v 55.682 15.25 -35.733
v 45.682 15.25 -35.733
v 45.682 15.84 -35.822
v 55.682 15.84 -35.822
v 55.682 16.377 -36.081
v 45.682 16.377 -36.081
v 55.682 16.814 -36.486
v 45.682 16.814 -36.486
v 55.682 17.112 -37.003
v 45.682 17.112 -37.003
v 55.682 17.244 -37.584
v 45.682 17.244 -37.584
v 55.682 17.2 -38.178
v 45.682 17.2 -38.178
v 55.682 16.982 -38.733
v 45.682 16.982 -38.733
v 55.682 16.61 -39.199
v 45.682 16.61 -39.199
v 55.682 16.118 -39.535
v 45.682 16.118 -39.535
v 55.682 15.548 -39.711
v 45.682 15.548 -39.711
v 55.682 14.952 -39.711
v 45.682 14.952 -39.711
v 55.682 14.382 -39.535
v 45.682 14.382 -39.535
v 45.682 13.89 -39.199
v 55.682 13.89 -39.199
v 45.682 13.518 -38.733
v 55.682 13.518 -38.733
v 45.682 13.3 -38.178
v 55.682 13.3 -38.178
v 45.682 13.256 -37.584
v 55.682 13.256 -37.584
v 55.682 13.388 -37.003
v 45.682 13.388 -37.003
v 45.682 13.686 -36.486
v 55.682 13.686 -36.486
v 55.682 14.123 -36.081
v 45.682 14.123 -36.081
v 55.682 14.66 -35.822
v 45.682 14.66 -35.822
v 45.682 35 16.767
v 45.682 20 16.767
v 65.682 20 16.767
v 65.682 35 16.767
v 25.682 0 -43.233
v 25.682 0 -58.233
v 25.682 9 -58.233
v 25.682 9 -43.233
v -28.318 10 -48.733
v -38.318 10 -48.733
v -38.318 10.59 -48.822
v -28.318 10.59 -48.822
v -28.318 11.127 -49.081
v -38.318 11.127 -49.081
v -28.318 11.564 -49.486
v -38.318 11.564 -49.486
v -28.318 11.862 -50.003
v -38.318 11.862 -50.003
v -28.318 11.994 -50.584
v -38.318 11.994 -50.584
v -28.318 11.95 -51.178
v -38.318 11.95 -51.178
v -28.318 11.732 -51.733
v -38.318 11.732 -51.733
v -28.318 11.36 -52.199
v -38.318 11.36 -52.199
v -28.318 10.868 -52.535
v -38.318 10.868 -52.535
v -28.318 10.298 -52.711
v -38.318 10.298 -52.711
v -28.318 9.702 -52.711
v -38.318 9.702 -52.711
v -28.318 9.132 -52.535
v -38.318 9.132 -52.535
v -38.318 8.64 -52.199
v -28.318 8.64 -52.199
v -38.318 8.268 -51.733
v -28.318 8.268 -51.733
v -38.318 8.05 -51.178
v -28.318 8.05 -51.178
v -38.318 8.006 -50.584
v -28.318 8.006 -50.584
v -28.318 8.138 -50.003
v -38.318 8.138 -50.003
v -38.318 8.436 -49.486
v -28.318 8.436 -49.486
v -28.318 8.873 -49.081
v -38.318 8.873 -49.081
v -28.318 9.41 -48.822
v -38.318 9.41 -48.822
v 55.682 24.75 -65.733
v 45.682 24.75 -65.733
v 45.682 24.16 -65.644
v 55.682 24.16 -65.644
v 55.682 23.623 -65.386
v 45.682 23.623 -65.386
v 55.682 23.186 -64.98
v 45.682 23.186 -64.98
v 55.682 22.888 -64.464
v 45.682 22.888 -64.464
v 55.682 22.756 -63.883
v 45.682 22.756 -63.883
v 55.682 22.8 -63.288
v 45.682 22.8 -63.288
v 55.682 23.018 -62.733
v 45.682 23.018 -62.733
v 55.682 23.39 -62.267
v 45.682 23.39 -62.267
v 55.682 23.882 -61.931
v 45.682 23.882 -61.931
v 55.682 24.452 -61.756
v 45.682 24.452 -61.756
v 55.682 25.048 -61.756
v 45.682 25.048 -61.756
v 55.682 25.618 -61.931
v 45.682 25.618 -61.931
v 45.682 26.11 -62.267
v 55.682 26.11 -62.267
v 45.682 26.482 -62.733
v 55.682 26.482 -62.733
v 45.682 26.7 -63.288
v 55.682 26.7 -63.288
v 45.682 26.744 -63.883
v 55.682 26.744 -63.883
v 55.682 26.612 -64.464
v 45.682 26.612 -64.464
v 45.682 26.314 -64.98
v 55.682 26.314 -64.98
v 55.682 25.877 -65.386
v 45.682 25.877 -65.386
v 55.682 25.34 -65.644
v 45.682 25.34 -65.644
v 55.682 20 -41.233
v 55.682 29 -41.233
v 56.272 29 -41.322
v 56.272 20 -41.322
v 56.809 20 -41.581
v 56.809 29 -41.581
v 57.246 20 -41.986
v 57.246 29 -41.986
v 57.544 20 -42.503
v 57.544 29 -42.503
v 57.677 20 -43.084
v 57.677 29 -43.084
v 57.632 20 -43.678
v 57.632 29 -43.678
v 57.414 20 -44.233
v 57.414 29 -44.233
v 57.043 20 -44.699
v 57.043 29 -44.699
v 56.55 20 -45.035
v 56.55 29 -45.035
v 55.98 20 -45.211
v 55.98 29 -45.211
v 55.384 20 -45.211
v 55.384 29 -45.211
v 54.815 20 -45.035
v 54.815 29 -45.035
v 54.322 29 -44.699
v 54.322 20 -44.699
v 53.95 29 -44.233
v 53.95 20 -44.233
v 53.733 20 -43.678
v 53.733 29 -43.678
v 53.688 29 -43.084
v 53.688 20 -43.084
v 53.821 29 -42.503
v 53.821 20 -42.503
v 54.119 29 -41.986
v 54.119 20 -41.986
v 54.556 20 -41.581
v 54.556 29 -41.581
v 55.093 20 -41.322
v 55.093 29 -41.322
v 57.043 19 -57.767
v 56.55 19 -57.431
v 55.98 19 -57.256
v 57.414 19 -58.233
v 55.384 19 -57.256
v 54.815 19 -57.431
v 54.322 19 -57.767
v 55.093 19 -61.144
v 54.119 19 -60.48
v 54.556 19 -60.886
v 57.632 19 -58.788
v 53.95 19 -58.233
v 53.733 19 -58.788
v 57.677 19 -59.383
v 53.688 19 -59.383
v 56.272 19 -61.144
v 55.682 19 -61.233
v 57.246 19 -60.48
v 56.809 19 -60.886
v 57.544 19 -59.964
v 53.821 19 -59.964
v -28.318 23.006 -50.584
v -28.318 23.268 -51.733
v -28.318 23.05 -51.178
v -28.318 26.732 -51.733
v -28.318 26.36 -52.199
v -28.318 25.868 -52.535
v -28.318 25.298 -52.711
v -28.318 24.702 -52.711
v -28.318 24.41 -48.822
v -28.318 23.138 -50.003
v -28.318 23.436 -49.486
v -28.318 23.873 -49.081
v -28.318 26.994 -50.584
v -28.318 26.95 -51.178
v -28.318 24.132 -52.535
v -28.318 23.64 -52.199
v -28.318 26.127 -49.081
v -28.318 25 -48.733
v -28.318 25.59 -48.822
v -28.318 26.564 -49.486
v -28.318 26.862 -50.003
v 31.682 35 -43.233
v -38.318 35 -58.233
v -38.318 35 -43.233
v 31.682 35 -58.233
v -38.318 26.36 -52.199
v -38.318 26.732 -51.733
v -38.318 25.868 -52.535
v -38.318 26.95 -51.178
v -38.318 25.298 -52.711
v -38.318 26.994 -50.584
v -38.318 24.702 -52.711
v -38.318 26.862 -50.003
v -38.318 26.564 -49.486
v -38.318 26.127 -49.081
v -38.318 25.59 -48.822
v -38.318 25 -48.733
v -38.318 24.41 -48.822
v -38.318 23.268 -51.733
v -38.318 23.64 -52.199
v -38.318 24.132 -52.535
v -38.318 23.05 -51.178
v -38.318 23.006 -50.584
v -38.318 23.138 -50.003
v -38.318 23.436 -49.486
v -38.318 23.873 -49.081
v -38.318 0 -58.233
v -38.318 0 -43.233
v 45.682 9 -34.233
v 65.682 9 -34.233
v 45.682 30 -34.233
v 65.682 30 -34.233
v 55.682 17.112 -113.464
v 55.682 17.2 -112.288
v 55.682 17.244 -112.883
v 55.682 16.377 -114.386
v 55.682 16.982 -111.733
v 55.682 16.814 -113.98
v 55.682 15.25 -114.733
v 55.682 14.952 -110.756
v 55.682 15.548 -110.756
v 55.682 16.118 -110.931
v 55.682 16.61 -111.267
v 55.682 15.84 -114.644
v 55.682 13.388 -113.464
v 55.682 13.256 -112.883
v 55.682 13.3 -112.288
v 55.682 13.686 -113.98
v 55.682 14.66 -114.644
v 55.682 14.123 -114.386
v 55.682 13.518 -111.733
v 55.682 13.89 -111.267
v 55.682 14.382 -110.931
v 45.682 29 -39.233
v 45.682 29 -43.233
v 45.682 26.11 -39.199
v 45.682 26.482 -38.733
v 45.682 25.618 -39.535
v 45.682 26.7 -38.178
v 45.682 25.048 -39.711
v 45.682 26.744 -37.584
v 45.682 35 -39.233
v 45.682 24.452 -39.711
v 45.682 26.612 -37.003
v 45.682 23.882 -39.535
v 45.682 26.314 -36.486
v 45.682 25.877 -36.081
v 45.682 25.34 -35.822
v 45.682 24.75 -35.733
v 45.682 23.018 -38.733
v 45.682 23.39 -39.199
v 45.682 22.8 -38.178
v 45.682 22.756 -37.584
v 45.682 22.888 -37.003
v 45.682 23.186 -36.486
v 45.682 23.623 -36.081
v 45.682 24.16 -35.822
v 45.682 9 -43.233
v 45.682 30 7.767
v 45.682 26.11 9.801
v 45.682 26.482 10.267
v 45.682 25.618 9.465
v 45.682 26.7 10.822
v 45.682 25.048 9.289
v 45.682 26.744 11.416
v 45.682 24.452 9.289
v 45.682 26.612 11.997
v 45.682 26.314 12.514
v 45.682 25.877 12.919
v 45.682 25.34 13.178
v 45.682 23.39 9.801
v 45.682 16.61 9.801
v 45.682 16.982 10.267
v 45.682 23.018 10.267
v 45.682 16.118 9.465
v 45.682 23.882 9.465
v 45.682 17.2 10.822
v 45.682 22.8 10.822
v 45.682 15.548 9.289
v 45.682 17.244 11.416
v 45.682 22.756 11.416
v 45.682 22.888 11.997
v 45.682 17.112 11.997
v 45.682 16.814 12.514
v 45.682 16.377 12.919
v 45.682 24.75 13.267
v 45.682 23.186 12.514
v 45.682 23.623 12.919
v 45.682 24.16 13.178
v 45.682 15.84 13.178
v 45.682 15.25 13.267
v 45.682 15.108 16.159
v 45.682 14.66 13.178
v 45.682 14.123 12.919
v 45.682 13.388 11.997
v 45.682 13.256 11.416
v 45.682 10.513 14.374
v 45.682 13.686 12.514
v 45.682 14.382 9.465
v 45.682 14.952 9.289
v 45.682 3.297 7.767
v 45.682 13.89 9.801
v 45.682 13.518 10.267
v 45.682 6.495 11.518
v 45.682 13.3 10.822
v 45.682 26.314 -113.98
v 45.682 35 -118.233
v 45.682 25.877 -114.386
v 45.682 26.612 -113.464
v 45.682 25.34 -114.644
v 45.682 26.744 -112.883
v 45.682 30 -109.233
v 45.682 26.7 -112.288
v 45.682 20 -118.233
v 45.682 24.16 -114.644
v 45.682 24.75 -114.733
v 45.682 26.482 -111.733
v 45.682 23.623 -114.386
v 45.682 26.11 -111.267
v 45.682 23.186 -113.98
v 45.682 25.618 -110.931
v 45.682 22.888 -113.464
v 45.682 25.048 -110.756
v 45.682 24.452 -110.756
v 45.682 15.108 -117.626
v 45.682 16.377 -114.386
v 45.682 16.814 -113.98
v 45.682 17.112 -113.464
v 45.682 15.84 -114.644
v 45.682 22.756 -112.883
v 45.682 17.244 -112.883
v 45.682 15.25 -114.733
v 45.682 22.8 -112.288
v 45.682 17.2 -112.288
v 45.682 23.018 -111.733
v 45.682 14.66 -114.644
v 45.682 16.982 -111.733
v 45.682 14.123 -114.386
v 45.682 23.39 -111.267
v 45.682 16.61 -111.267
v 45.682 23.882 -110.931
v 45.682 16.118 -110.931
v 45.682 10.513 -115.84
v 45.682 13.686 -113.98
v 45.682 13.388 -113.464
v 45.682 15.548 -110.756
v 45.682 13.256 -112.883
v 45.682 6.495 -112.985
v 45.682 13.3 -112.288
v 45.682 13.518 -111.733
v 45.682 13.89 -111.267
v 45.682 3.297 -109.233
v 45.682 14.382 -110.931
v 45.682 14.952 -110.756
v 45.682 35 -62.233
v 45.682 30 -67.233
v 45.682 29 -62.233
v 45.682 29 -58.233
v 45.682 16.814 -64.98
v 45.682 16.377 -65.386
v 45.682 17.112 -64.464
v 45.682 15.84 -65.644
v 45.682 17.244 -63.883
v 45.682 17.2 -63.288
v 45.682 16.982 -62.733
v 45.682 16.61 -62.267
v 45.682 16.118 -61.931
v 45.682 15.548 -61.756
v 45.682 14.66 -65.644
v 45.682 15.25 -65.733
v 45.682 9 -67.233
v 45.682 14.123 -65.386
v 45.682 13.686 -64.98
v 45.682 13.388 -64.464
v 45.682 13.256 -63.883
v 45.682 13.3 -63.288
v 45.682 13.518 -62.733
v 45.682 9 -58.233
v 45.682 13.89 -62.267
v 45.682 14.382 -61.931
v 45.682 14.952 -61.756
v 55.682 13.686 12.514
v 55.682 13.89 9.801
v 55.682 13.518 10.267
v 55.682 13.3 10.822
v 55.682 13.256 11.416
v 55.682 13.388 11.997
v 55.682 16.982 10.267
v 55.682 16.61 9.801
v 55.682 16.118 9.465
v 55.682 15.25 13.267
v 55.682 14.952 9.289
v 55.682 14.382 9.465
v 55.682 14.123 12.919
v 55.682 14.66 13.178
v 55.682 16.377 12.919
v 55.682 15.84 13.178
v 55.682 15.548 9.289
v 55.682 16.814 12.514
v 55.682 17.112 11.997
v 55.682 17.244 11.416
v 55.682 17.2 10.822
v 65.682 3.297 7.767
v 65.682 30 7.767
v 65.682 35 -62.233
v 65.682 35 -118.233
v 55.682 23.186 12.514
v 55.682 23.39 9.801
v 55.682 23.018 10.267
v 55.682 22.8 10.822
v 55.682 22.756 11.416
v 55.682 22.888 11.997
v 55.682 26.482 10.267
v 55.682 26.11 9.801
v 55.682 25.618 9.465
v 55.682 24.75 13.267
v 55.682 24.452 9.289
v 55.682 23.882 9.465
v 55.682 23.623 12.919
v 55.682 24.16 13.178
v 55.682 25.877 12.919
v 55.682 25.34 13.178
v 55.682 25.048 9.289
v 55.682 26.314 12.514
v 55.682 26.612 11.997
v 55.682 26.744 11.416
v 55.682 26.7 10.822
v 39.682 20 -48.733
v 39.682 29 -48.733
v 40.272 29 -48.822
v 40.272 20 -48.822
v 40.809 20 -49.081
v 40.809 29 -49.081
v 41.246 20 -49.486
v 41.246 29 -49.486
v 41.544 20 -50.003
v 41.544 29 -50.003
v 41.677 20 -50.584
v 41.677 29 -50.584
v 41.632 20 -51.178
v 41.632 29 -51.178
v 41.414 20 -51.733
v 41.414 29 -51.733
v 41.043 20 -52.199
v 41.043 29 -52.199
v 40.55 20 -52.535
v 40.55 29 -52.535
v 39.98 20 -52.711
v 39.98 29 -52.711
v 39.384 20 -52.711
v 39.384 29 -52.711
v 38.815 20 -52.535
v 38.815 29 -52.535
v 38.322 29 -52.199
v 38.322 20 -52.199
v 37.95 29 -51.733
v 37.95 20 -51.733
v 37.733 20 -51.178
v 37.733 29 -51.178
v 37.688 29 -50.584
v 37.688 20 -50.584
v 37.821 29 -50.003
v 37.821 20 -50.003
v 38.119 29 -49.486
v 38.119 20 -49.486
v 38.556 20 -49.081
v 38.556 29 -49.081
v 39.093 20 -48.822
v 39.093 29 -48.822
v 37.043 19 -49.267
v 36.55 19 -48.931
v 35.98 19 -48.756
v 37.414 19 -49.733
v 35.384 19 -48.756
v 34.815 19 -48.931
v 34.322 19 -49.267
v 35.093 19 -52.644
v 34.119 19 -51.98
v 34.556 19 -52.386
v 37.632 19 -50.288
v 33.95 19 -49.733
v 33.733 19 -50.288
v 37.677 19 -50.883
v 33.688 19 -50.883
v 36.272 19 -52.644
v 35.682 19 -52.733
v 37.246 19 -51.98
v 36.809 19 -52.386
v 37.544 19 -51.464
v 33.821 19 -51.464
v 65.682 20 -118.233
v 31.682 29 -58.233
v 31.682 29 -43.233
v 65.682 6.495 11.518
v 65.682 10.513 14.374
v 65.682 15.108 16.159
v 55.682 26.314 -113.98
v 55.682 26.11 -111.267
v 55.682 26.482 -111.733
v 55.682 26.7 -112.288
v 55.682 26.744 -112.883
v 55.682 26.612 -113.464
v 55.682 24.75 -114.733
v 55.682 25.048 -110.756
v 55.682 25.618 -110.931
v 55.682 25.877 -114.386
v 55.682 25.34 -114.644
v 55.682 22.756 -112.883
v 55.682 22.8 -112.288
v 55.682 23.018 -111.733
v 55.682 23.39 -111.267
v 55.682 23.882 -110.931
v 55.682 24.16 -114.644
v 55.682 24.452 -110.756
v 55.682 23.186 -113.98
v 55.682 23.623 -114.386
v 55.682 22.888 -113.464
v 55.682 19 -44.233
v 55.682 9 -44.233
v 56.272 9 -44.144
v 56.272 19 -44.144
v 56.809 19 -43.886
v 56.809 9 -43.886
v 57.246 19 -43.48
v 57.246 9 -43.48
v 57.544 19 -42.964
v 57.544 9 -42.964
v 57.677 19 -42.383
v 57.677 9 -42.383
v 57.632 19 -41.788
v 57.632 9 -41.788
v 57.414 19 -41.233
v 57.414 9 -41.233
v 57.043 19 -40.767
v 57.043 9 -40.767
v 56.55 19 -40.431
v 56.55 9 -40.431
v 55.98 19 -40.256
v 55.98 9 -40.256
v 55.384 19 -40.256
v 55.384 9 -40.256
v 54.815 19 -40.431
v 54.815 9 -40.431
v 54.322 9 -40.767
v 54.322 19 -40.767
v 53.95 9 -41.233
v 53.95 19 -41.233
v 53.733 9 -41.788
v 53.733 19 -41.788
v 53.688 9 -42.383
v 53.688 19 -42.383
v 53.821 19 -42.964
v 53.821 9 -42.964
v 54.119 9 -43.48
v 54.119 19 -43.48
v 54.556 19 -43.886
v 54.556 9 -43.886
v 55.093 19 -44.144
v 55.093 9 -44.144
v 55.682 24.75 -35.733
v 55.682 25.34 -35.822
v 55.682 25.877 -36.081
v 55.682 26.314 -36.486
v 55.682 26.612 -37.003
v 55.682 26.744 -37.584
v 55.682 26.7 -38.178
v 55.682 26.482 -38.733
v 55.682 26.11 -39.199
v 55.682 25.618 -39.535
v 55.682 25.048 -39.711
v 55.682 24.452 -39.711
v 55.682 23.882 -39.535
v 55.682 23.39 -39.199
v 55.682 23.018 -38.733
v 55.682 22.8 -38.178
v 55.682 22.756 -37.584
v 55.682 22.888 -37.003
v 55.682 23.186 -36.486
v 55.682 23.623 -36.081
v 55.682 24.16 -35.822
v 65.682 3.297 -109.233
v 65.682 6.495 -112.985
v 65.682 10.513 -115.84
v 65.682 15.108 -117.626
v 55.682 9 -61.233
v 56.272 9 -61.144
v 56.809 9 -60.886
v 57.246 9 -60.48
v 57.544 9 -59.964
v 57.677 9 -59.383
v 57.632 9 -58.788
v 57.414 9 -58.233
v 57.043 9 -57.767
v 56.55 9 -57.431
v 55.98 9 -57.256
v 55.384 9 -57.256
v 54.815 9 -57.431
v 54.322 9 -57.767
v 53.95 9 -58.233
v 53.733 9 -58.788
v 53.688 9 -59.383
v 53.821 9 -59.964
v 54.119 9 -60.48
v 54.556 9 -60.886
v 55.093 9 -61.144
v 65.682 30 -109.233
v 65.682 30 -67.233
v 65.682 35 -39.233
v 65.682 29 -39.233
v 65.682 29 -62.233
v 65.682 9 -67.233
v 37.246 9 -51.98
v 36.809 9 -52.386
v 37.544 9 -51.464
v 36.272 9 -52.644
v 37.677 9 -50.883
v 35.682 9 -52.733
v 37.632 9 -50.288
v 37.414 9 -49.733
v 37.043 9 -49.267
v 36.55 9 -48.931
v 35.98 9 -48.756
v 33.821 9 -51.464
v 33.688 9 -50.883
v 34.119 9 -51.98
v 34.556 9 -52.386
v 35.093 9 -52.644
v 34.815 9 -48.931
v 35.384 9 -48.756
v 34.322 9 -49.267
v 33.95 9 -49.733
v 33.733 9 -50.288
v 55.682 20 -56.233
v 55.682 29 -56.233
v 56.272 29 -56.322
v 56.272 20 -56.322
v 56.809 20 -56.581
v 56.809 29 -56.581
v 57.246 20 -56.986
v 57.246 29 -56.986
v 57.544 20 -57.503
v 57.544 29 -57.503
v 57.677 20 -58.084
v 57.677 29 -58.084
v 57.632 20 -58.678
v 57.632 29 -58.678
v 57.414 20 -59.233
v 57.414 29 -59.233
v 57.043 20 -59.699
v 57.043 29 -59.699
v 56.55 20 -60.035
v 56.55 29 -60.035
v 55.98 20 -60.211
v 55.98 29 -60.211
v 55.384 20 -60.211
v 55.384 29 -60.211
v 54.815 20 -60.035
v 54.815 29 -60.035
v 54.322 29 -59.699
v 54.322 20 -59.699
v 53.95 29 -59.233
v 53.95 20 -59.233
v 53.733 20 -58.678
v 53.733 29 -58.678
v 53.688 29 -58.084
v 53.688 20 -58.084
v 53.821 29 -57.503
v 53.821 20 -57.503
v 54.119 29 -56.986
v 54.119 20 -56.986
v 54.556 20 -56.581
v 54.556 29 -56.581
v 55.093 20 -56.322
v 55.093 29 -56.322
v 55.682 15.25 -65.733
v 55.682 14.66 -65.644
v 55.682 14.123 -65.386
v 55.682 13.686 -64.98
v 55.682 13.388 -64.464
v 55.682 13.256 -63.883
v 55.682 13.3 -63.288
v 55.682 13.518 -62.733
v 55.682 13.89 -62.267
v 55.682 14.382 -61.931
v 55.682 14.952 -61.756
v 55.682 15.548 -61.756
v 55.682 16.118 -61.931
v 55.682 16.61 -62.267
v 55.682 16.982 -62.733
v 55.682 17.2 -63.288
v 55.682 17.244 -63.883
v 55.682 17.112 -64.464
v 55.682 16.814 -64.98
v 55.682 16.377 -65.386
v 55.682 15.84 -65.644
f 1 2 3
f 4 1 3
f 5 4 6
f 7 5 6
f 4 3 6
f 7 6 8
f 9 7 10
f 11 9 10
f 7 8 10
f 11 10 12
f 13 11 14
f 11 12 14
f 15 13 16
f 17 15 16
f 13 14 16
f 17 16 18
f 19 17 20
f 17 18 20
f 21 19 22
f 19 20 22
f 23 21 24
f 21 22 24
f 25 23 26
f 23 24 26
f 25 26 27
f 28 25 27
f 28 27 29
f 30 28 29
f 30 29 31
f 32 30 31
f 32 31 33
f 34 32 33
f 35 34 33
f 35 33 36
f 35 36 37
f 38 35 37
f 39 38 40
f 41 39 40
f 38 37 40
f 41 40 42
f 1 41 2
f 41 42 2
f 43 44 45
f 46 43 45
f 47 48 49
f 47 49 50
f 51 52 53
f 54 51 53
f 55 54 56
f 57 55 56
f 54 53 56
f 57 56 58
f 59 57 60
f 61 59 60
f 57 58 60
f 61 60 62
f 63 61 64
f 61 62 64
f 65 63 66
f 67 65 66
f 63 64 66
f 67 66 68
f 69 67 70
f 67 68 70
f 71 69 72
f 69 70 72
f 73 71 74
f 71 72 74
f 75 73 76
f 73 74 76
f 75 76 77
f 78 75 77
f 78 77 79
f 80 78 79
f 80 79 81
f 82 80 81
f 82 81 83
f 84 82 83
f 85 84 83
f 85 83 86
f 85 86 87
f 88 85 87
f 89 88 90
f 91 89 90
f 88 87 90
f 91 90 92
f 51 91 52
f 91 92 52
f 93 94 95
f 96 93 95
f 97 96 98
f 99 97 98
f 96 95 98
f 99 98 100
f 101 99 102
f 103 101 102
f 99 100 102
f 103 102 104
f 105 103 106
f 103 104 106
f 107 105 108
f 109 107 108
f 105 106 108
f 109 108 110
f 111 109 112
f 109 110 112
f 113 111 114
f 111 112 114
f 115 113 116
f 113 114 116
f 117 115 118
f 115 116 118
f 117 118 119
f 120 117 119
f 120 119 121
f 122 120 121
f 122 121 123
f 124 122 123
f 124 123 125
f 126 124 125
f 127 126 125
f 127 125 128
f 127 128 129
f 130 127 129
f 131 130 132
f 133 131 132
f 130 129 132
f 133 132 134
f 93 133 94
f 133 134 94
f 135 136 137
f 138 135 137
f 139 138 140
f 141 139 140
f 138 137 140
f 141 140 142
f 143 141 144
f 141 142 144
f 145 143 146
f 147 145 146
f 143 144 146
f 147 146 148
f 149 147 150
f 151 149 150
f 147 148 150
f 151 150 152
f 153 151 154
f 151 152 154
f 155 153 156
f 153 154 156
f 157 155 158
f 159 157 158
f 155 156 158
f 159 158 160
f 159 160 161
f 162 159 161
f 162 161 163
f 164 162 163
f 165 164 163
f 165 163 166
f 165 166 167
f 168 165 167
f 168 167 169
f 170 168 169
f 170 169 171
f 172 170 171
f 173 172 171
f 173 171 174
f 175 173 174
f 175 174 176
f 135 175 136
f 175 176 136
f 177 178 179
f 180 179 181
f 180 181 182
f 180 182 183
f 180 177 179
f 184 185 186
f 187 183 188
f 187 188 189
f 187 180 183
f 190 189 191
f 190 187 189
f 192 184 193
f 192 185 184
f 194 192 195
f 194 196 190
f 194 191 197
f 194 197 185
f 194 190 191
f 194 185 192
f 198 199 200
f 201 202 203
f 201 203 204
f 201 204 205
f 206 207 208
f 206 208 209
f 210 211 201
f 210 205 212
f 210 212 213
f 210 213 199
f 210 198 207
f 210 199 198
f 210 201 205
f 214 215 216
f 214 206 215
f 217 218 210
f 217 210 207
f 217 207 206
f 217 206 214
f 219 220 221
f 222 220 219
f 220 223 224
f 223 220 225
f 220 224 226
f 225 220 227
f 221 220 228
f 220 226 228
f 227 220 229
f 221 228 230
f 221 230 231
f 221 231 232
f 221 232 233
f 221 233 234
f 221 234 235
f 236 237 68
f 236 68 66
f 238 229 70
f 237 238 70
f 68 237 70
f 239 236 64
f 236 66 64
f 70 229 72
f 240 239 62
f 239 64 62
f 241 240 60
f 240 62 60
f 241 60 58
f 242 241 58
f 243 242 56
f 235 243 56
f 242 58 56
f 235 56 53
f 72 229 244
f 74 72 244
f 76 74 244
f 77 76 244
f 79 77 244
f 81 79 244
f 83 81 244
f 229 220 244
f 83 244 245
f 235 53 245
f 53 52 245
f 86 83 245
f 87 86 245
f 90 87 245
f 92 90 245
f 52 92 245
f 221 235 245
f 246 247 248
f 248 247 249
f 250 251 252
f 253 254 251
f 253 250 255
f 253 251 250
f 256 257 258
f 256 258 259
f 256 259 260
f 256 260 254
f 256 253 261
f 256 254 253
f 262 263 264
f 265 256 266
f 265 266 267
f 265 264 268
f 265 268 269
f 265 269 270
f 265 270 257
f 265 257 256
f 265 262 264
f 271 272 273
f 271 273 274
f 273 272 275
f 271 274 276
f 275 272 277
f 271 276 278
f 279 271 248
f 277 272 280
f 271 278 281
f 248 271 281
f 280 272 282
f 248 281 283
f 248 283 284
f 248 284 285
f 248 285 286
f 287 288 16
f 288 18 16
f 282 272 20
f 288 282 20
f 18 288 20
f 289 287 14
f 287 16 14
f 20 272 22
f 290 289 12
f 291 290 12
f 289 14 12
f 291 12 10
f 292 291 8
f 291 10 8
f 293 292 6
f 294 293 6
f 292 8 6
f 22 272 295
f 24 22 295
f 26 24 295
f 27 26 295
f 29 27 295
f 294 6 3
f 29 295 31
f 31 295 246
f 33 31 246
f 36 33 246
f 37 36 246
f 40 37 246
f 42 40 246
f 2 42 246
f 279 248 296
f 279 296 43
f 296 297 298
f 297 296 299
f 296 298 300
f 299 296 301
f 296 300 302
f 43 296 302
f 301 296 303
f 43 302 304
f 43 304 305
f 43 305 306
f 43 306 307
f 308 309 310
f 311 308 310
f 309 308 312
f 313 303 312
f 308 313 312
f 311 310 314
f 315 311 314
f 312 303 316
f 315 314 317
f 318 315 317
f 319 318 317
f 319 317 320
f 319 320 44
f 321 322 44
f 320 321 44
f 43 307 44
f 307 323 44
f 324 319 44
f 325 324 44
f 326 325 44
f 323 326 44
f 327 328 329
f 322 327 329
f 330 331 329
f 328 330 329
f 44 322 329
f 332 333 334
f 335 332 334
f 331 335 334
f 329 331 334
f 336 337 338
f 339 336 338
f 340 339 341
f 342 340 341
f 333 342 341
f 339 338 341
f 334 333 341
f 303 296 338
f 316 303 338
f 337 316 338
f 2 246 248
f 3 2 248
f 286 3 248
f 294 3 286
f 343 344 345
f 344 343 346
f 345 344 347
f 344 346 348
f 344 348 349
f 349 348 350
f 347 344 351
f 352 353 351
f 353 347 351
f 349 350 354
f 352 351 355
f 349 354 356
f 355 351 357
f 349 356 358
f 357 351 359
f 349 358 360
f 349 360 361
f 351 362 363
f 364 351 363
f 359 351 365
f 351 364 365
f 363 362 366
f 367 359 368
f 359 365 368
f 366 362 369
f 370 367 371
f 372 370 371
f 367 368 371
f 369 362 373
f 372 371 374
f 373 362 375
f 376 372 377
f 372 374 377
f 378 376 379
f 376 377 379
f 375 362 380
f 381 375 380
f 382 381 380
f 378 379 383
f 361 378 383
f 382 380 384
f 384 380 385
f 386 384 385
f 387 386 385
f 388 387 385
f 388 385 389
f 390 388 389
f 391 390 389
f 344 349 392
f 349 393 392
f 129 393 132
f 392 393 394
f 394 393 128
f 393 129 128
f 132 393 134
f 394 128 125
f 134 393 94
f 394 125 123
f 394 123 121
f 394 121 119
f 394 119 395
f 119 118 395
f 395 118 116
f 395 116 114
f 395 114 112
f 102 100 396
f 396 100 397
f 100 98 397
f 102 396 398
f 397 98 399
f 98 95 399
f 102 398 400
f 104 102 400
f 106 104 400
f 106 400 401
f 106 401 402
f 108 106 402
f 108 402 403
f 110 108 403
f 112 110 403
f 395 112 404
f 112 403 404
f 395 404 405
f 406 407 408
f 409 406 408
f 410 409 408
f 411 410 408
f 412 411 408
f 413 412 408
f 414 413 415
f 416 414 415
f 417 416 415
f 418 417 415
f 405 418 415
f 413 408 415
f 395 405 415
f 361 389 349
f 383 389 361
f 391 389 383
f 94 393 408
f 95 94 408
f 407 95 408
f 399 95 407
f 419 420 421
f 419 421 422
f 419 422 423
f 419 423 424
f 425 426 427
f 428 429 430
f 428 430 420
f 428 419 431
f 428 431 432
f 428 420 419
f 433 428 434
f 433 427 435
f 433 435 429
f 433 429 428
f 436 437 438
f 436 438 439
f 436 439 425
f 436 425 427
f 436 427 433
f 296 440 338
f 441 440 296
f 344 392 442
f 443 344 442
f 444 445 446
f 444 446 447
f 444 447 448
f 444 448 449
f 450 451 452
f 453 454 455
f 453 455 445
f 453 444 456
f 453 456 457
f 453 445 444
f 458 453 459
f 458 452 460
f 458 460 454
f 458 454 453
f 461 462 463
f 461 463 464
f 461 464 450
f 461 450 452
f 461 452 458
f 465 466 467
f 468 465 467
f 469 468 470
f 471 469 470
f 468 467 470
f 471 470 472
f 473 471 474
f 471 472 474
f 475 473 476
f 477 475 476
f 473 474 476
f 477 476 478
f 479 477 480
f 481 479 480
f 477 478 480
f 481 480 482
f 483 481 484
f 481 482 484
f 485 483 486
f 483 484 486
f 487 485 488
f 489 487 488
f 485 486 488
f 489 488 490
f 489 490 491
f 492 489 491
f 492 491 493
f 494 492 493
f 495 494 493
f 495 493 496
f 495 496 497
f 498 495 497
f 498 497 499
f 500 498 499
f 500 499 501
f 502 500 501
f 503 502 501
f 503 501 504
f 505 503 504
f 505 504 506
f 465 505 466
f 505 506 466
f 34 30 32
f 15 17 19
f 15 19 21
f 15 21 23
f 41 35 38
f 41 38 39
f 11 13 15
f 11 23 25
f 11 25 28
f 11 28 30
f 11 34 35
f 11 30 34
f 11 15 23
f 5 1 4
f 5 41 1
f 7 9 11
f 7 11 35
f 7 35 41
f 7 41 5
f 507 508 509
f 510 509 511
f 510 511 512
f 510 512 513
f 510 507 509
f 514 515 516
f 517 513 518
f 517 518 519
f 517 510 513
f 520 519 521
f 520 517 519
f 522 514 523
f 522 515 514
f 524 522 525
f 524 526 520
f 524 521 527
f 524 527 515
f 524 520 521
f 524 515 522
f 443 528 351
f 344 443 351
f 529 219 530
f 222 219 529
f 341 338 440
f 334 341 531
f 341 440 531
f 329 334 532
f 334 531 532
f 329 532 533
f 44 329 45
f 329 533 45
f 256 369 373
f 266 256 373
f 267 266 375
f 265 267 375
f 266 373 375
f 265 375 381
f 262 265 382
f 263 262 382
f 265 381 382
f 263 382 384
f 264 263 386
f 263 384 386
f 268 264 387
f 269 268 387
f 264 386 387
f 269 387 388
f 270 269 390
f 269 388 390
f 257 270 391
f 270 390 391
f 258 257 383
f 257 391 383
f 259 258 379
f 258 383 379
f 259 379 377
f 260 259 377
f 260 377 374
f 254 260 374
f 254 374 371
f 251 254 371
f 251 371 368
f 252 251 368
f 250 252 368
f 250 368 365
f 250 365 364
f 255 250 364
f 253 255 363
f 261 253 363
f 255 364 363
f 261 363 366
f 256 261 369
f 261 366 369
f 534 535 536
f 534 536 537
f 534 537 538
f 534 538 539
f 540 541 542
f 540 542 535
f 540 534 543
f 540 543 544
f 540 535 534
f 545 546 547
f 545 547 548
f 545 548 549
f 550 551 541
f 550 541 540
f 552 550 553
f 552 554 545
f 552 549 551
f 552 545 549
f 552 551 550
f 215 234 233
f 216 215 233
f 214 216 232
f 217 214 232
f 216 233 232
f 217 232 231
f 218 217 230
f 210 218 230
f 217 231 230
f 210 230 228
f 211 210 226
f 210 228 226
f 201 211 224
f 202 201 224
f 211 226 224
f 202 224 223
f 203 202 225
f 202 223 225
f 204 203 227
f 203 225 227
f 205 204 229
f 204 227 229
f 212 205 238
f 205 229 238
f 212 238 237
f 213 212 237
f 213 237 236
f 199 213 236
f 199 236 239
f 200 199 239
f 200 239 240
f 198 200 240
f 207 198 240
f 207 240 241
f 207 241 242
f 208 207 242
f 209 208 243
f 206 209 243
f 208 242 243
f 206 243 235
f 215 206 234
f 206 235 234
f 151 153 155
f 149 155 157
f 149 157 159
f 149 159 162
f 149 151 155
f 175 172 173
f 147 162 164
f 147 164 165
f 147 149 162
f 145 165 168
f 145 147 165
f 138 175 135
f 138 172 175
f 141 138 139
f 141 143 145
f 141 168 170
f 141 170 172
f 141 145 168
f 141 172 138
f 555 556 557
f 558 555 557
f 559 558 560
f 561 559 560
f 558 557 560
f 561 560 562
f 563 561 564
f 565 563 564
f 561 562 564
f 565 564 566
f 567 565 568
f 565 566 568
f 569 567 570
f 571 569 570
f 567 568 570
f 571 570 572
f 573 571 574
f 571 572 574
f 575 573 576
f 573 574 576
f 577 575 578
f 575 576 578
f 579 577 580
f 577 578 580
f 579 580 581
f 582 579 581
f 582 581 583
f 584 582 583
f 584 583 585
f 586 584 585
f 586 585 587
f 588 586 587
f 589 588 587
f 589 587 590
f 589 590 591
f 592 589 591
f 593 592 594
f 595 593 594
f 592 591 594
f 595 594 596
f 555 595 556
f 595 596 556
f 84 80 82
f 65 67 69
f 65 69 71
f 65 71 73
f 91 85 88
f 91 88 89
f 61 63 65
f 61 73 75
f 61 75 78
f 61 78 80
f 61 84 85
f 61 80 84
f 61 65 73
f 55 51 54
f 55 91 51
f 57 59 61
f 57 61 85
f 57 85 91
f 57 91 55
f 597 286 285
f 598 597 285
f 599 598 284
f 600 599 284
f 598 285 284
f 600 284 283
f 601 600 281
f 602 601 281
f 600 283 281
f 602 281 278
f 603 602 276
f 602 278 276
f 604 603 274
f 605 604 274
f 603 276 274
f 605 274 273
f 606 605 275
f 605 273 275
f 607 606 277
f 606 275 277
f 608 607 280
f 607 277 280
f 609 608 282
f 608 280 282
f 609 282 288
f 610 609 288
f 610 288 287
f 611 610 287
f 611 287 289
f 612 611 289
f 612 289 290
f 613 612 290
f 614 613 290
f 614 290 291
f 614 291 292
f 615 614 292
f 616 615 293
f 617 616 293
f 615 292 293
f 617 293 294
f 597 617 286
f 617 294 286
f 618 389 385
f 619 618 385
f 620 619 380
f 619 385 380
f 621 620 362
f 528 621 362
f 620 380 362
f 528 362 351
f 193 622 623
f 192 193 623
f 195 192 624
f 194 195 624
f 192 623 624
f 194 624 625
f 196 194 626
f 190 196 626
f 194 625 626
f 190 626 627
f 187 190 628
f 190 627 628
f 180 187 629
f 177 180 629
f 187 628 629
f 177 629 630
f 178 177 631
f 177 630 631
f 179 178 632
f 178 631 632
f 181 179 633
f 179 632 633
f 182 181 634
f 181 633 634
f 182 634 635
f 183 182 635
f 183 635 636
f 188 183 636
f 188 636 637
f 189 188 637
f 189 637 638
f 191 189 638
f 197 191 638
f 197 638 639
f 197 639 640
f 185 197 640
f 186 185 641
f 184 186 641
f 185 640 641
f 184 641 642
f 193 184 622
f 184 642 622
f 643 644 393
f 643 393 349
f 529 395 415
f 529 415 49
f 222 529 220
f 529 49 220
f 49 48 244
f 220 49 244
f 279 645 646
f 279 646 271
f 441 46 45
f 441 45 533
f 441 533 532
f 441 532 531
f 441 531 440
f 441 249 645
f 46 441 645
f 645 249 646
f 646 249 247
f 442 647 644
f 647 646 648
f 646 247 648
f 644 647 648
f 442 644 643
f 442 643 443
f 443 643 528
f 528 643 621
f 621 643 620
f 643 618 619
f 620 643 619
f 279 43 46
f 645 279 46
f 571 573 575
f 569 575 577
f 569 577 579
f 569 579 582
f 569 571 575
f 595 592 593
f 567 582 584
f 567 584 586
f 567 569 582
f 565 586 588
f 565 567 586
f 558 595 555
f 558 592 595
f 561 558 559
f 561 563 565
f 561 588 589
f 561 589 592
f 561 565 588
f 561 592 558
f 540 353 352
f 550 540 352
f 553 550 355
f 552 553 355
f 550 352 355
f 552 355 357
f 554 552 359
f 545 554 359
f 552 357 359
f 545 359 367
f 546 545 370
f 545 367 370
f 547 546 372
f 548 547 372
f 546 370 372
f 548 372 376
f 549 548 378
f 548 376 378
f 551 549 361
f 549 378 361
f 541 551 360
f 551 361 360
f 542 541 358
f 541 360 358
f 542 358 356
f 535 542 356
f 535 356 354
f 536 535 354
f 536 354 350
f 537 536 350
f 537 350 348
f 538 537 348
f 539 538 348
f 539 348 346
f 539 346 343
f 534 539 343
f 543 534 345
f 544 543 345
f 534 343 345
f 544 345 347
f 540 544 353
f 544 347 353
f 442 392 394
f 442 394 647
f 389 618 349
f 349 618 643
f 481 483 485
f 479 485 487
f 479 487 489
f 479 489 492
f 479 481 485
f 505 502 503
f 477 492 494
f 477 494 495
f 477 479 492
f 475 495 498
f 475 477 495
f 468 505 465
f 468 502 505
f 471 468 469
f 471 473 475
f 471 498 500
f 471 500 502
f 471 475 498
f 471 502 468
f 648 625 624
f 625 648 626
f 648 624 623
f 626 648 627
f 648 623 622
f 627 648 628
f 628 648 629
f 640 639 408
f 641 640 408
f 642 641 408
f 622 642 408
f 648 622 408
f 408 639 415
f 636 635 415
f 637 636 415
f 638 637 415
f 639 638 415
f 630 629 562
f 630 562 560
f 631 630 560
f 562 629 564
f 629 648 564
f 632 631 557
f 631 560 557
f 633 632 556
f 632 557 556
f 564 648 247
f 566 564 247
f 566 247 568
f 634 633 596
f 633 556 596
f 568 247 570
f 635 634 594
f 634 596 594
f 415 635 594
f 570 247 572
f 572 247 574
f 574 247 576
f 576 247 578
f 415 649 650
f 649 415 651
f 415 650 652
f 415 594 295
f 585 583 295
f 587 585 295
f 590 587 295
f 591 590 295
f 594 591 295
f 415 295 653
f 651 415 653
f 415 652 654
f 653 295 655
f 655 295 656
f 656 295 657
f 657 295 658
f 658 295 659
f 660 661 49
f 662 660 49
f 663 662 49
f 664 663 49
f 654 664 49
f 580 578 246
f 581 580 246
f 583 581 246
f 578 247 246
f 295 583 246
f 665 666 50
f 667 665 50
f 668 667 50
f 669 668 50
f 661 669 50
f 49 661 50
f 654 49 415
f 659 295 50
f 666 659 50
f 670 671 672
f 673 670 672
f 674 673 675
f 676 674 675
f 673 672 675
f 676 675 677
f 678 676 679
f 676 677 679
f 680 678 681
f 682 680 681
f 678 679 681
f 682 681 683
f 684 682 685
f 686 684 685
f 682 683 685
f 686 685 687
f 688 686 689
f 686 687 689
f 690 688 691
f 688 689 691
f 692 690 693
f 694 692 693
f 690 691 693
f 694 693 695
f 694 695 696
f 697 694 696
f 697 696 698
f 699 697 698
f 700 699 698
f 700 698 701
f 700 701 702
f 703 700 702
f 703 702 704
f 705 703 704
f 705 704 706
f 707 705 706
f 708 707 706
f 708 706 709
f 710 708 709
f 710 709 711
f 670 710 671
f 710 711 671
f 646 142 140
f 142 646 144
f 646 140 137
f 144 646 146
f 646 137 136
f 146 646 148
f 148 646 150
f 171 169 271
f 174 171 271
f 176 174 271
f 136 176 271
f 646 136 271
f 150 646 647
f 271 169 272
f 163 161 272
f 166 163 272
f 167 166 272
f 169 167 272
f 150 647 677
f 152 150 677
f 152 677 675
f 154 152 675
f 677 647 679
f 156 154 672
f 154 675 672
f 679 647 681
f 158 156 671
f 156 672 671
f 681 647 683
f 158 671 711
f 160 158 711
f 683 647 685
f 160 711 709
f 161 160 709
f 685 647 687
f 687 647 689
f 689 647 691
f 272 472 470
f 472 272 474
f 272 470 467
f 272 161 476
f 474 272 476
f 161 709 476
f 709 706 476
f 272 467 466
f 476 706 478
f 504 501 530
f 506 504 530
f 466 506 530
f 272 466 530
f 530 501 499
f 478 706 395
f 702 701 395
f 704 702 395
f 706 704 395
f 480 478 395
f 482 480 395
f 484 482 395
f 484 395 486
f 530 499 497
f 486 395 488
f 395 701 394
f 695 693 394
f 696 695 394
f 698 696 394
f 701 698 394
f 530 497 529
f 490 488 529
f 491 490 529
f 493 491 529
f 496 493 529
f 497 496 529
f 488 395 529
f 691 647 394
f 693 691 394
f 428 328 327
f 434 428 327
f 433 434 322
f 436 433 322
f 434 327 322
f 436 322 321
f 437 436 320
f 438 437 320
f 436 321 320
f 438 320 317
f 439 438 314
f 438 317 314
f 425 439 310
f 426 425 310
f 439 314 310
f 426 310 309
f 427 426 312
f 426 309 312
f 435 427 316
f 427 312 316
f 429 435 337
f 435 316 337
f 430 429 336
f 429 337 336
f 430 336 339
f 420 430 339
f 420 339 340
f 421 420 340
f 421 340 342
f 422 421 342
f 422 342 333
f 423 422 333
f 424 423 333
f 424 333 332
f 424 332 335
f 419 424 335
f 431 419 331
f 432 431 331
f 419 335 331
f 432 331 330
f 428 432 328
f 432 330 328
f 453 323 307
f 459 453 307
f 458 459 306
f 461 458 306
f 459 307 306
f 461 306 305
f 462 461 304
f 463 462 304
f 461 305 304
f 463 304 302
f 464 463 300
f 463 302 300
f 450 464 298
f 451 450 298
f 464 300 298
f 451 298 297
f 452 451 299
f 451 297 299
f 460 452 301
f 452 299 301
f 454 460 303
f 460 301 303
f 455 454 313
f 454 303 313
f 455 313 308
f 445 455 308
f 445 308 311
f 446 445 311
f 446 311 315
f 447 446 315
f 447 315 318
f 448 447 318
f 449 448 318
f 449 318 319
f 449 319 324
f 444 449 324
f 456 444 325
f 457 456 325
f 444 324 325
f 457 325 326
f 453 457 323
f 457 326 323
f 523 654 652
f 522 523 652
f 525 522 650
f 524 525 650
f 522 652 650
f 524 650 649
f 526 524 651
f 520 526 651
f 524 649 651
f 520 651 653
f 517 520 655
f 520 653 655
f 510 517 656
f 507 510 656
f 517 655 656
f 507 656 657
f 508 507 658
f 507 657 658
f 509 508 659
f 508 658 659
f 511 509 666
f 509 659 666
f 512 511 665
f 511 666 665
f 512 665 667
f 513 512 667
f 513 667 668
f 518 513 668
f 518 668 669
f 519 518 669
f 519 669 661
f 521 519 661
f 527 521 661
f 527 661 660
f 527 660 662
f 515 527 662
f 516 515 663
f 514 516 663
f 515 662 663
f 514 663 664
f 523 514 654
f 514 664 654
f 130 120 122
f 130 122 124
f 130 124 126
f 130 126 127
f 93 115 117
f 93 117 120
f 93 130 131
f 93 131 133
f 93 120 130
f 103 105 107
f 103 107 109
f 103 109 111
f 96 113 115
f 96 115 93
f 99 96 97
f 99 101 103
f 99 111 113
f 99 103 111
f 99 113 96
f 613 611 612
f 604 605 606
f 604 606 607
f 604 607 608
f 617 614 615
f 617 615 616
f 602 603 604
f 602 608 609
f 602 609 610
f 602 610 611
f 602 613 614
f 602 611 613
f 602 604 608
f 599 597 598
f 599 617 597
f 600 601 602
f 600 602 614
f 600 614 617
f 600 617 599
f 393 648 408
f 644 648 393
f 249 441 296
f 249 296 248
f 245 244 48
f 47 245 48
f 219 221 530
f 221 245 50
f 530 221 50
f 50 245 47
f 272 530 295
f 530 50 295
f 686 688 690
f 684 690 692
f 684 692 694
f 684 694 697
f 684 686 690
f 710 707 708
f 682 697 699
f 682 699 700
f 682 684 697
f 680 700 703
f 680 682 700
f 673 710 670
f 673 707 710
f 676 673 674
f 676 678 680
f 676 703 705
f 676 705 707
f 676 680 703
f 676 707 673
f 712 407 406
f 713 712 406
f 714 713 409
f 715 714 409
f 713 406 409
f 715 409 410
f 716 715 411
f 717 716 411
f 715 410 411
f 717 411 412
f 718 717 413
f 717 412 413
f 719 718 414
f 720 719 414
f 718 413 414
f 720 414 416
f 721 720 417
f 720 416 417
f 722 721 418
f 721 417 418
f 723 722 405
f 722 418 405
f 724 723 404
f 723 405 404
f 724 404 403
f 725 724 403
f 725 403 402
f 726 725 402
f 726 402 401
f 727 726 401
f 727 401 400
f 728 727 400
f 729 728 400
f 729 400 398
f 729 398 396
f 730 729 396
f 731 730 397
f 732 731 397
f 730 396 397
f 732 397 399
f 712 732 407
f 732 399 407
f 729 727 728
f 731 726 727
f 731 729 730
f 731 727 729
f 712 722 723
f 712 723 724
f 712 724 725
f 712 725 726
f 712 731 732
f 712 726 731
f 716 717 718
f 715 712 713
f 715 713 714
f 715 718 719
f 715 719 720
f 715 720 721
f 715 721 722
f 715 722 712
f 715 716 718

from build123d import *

# Parameters (mm, degrees)
BOSS_EXTRUDE1_DEPTH = 35
CUT_EXTRUDE1_REACH  = 163.307
SKETCH2_W           = 42
SKETCH2_H           = 21
SKETCH3_R           = 2
CUT_EXTRUDE2_DEPTH  = 10
FILLET1_R           = 20
CUT_EXTRUDE5_REACH  = 163.307
SKETCH6_W           = 42
SKETCH6_H           = 9
SKETCH7_R           = 2
CUT_EXTRUDE6_DEPTH  = 10
CUT_EXTRUDE7_DEPTH  = 9
SKETCH9_R           = 2
CUT_EXTRUDE8_DEPTH  = 10
CUT_EXTRUDE9_DEPTH  = 6
SKETCH11_R          = 2
CUT_EXTRUDE10_DEPTH = 9


with BuildPart() as part:
    # Sketch1 → Boss-Extrude1 (new body)
    with BuildSketch(Plane(origin=(0, 0, 0), x_dir=(1, 0, 0), z_dir=(0, 1, 0))):
        Polygon((-38.317617866, 43.23325062), (45.682382134, 43.23325062), (45.682382134, -16.76674938), (65.682382134, -16.76674938), (65.682382134, 118.23325062), (45.682382134, 118.23325062), (45.682382134, 58.23325062), (-38.317617866, 58.23325062), align=None)
    extrude(amount=BOSS_EXTRUDE1_DEPTH)

    # Sketch2 → Cut-Extrude1 (cut, up to next)
    with BuildSketch(Plane(origin=(65.682382134, 0, 0), x_dir=(0, 0, -1), z_dir=(1, 0, 0)), mode=Mode.PRIVATE) as cut_extrude1_sk1:
        with Locations((13.23325062, 19.5)):
            Rectangle(SKETCH2_W, SKETCH2_H)
    cut_extrude1_tool1 = extrude(cut_extrude1_sk1.sketch, amount=-CUT_EXTRUDE1_REACH, mode=Mode.PRIVATE) & part.part
    # Sketch2 → Cut-Extrude1 (cut, up to next)
    with BuildSketch(Plane(origin=(65.682382134, 0, 0), x_dir=(0, 0, -1), z_dir=(1, 0, 0)), mode=Mode.PRIVATE) as cut_extrude1_sk2:
        with Locations((88.23325062, 19.5)):
            Rectangle(SKETCH2_W, SKETCH2_H)
    cut_extrude1_tool2 = extrude(cut_extrude1_sk2.sketch, amount=-CUT_EXTRUDE1_REACH, mode=Mode.PRIVATE) & part.part
    add(cut_extrude1_tool1.solids().sort_by_distance((65.682382, 19.5, -13.233251))[0], mode=Mode.SUBTRACT)
    add(cut_extrude1_tool2.solids().sort_by_distance((65.682382, 19.5, -88.233251))[0], mode=Mode.SUBTRACT)

    # Sketch3 → Cut-Extrude2 (cut)
    with BuildSketch(Plane.ZY.offset(-45.682382134)):
        with Locations((11.26674938, 24.75)):
            Circle(SKETCH3_R)
        with Locations((11.26674938, 15.25)):
            Circle(SKETCH3_R)
        with Locations((-37.73325062, 24.75)):
            Circle(SKETCH3_R)
        with Locations((-37.73325062, 15.25)):
            Circle(SKETCH3_R)
        with Locations(Location((-112.73325062, 24.75, 0), (0, 0, 180))):
            Circle(SKETCH3_R)
        with Locations(Location((-112.73325062, 15.25, 0), (0, 0, 180))):
            Circle(SKETCH3_R)
        with Locations(Location((-63.73325062, 15.25, 0), (0, 0, 180))):
            Circle(SKETCH3_R)
        with Locations(Location((-63.73325062, 24.75, 0), (0, 0, 180))):
            Circle(SKETCH3_R)
    extrude(amount=-CUT_EXTRUDE2_DEPTH, mode=Mode.SUBTRACT)

    # Fillet1
    fillet1_edges = [part.edges().sort_by_distance(p)[0] for p in [
        (55.682382134, 0, -118.23325062),
        (55.682382134, 0, 16.76674938),
    ]]
    fillet(fillet1_edges, radius=FILLET1_R)

    # Sketch6 → Cut-Extrude5 (cut, up to next)
    with BuildSketch(Plane(origin=(65.682382134, 0, 0), x_dir=(0, 0, -1), z_dir=(1, 0, 0)), mode=Mode.PRIVATE) as cut_extrude5_sk1:
        with Locations((13.23325062, 4.5)):
            Rectangle(SKETCH6_W, SKETCH6_H)
    cut_extrude5_tool1 = extrude(cut_extrude5_sk1.sketch, amount=-CUT_EXTRUDE5_REACH, mode=Mode.PRIVATE) & part.part
    # Sketch6 → Cut-Extrude5 (cut, up to next)
    with BuildSketch(Plane(origin=(65.682382134, 0, 0), x_dir=(0, 0, -1), z_dir=(1, 0, 0)), mode=Mode.PRIVATE) as cut_extrude5_sk2:
        with Locations((88.23325062, 4.5)):
            Rectangle(SKETCH6_W, SKETCH6_H)
    cut_extrude5_tool2 = extrude(cut_extrude5_sk2.sketch, amount=-CUT_EXTRUDE5_REACH, mode=Mode.PRIVATE) & part.part
    add(cut_extrude5_tool1.solids().sort_by_distance((65.682382, 4.5, -13.233251))[0], mode=Mode.SUBTRACT)
    add(cut_extrude5_tool2.solids().sort_by_distance((65.682382, 4.5, -88.233251))[0], mode=Mode.SUBTRACT)

    # Sketch7 → Cut-Extrude6 (cut)
    with BuildSketch(Plane.ZY.offset(38.317617866)):
        with Locations((-50.73325062, 25)):
            Circle(SKETCH7_R)
        with Locations((-50.73325062, 10)):
            Circle(SKETCH7_R)
    extrude(amount=-CUT_EXTRUDE6_DEPTH, mode=Mode.SUBTRACT)

    # Sketch8 → Cut-Extrude7 (cut)
    with BuildSketch(Plane.XZ):
        Polygon((45.682382134, -67.23325062), (45.682382134, -58.23325062), (25.682382134, -58.23325062), (25.682382134, -43.23325062), (45.682382134, -43.23325062), (45.682382134, -34.23325062), (65.682382134, -34.23325062), (65.682382134, -67.23325062), align=None)
    extrude(amount=-CUT_EXTRUDE7_DEPTH, mode=Mode.SUBTRACT)

    # Sketch9 → Cut-Extrude8 (cut)
    with BuildSketch(Plane.XZ.offset(-9)):
        with Locations(Location((55.682382134, -42.23325062, 0), (0, 0, 270))):
            Circle(SKETCH9_R)
        with Locations(Location((55.682382134, -59.23325062, 0), (0, 0, 270))):
            Circle(SKETCH9_R)
        with Locations(Location((35.682382134, -50.73325062, 0), (0, 0, 270))):
            Circle(SKETCH9_R)
    extrude(amount=-CUT_EXTRUDE8_DEPTH, mode=Mode.SUBTRACT)

    # Sketch10 → Cut-Extrude9 (cut)
    with BuildSketch(Plane(origin=(0, 35, 0), x_dir=(1, 0, 0), z_dir=(0, 1, 0))):
        Polygon((45.682382134, 62.23325062), (65.682382134, 62.23325062), (65.682382134, 39.23325062), (45.682382134, 39.23325062), (45.682382134, 43.23325062), (31.682382134, 43.23325062), (31.682382134, 58.23325062), (45.682382134, 58.23325062), align=None)
    extrude(amount=-CUT_EXTRUDE9_DEPTH, mode=Mode.SUBTRACT)

    # Sketch11 → Cut-Extrude10 (cut)
    with BuildSketch(Plane(origin=(0, 29, 0), x_dir=(1, 0, 0), z_dir=(0, 1, 0))):
        with Locations(Location((55.682382134, 58.23325062, 0), (0, 0, 270))):
            Circle(SKETCH11_R)
        with Locations(Location((55.682382134, 43.23325062, 0), (0, 0, 270))):
            Circle(SKETCH11_R)
        with Locations(Location((39.682382134, 50.73325062, 0), (0, 0, 270))):
            Circle(SKETCH11_R)
    extrude(amount=-CUT_EXTRUDE10_DEPTH, mode=Mode.SUBTRACT)


solid = part.part
